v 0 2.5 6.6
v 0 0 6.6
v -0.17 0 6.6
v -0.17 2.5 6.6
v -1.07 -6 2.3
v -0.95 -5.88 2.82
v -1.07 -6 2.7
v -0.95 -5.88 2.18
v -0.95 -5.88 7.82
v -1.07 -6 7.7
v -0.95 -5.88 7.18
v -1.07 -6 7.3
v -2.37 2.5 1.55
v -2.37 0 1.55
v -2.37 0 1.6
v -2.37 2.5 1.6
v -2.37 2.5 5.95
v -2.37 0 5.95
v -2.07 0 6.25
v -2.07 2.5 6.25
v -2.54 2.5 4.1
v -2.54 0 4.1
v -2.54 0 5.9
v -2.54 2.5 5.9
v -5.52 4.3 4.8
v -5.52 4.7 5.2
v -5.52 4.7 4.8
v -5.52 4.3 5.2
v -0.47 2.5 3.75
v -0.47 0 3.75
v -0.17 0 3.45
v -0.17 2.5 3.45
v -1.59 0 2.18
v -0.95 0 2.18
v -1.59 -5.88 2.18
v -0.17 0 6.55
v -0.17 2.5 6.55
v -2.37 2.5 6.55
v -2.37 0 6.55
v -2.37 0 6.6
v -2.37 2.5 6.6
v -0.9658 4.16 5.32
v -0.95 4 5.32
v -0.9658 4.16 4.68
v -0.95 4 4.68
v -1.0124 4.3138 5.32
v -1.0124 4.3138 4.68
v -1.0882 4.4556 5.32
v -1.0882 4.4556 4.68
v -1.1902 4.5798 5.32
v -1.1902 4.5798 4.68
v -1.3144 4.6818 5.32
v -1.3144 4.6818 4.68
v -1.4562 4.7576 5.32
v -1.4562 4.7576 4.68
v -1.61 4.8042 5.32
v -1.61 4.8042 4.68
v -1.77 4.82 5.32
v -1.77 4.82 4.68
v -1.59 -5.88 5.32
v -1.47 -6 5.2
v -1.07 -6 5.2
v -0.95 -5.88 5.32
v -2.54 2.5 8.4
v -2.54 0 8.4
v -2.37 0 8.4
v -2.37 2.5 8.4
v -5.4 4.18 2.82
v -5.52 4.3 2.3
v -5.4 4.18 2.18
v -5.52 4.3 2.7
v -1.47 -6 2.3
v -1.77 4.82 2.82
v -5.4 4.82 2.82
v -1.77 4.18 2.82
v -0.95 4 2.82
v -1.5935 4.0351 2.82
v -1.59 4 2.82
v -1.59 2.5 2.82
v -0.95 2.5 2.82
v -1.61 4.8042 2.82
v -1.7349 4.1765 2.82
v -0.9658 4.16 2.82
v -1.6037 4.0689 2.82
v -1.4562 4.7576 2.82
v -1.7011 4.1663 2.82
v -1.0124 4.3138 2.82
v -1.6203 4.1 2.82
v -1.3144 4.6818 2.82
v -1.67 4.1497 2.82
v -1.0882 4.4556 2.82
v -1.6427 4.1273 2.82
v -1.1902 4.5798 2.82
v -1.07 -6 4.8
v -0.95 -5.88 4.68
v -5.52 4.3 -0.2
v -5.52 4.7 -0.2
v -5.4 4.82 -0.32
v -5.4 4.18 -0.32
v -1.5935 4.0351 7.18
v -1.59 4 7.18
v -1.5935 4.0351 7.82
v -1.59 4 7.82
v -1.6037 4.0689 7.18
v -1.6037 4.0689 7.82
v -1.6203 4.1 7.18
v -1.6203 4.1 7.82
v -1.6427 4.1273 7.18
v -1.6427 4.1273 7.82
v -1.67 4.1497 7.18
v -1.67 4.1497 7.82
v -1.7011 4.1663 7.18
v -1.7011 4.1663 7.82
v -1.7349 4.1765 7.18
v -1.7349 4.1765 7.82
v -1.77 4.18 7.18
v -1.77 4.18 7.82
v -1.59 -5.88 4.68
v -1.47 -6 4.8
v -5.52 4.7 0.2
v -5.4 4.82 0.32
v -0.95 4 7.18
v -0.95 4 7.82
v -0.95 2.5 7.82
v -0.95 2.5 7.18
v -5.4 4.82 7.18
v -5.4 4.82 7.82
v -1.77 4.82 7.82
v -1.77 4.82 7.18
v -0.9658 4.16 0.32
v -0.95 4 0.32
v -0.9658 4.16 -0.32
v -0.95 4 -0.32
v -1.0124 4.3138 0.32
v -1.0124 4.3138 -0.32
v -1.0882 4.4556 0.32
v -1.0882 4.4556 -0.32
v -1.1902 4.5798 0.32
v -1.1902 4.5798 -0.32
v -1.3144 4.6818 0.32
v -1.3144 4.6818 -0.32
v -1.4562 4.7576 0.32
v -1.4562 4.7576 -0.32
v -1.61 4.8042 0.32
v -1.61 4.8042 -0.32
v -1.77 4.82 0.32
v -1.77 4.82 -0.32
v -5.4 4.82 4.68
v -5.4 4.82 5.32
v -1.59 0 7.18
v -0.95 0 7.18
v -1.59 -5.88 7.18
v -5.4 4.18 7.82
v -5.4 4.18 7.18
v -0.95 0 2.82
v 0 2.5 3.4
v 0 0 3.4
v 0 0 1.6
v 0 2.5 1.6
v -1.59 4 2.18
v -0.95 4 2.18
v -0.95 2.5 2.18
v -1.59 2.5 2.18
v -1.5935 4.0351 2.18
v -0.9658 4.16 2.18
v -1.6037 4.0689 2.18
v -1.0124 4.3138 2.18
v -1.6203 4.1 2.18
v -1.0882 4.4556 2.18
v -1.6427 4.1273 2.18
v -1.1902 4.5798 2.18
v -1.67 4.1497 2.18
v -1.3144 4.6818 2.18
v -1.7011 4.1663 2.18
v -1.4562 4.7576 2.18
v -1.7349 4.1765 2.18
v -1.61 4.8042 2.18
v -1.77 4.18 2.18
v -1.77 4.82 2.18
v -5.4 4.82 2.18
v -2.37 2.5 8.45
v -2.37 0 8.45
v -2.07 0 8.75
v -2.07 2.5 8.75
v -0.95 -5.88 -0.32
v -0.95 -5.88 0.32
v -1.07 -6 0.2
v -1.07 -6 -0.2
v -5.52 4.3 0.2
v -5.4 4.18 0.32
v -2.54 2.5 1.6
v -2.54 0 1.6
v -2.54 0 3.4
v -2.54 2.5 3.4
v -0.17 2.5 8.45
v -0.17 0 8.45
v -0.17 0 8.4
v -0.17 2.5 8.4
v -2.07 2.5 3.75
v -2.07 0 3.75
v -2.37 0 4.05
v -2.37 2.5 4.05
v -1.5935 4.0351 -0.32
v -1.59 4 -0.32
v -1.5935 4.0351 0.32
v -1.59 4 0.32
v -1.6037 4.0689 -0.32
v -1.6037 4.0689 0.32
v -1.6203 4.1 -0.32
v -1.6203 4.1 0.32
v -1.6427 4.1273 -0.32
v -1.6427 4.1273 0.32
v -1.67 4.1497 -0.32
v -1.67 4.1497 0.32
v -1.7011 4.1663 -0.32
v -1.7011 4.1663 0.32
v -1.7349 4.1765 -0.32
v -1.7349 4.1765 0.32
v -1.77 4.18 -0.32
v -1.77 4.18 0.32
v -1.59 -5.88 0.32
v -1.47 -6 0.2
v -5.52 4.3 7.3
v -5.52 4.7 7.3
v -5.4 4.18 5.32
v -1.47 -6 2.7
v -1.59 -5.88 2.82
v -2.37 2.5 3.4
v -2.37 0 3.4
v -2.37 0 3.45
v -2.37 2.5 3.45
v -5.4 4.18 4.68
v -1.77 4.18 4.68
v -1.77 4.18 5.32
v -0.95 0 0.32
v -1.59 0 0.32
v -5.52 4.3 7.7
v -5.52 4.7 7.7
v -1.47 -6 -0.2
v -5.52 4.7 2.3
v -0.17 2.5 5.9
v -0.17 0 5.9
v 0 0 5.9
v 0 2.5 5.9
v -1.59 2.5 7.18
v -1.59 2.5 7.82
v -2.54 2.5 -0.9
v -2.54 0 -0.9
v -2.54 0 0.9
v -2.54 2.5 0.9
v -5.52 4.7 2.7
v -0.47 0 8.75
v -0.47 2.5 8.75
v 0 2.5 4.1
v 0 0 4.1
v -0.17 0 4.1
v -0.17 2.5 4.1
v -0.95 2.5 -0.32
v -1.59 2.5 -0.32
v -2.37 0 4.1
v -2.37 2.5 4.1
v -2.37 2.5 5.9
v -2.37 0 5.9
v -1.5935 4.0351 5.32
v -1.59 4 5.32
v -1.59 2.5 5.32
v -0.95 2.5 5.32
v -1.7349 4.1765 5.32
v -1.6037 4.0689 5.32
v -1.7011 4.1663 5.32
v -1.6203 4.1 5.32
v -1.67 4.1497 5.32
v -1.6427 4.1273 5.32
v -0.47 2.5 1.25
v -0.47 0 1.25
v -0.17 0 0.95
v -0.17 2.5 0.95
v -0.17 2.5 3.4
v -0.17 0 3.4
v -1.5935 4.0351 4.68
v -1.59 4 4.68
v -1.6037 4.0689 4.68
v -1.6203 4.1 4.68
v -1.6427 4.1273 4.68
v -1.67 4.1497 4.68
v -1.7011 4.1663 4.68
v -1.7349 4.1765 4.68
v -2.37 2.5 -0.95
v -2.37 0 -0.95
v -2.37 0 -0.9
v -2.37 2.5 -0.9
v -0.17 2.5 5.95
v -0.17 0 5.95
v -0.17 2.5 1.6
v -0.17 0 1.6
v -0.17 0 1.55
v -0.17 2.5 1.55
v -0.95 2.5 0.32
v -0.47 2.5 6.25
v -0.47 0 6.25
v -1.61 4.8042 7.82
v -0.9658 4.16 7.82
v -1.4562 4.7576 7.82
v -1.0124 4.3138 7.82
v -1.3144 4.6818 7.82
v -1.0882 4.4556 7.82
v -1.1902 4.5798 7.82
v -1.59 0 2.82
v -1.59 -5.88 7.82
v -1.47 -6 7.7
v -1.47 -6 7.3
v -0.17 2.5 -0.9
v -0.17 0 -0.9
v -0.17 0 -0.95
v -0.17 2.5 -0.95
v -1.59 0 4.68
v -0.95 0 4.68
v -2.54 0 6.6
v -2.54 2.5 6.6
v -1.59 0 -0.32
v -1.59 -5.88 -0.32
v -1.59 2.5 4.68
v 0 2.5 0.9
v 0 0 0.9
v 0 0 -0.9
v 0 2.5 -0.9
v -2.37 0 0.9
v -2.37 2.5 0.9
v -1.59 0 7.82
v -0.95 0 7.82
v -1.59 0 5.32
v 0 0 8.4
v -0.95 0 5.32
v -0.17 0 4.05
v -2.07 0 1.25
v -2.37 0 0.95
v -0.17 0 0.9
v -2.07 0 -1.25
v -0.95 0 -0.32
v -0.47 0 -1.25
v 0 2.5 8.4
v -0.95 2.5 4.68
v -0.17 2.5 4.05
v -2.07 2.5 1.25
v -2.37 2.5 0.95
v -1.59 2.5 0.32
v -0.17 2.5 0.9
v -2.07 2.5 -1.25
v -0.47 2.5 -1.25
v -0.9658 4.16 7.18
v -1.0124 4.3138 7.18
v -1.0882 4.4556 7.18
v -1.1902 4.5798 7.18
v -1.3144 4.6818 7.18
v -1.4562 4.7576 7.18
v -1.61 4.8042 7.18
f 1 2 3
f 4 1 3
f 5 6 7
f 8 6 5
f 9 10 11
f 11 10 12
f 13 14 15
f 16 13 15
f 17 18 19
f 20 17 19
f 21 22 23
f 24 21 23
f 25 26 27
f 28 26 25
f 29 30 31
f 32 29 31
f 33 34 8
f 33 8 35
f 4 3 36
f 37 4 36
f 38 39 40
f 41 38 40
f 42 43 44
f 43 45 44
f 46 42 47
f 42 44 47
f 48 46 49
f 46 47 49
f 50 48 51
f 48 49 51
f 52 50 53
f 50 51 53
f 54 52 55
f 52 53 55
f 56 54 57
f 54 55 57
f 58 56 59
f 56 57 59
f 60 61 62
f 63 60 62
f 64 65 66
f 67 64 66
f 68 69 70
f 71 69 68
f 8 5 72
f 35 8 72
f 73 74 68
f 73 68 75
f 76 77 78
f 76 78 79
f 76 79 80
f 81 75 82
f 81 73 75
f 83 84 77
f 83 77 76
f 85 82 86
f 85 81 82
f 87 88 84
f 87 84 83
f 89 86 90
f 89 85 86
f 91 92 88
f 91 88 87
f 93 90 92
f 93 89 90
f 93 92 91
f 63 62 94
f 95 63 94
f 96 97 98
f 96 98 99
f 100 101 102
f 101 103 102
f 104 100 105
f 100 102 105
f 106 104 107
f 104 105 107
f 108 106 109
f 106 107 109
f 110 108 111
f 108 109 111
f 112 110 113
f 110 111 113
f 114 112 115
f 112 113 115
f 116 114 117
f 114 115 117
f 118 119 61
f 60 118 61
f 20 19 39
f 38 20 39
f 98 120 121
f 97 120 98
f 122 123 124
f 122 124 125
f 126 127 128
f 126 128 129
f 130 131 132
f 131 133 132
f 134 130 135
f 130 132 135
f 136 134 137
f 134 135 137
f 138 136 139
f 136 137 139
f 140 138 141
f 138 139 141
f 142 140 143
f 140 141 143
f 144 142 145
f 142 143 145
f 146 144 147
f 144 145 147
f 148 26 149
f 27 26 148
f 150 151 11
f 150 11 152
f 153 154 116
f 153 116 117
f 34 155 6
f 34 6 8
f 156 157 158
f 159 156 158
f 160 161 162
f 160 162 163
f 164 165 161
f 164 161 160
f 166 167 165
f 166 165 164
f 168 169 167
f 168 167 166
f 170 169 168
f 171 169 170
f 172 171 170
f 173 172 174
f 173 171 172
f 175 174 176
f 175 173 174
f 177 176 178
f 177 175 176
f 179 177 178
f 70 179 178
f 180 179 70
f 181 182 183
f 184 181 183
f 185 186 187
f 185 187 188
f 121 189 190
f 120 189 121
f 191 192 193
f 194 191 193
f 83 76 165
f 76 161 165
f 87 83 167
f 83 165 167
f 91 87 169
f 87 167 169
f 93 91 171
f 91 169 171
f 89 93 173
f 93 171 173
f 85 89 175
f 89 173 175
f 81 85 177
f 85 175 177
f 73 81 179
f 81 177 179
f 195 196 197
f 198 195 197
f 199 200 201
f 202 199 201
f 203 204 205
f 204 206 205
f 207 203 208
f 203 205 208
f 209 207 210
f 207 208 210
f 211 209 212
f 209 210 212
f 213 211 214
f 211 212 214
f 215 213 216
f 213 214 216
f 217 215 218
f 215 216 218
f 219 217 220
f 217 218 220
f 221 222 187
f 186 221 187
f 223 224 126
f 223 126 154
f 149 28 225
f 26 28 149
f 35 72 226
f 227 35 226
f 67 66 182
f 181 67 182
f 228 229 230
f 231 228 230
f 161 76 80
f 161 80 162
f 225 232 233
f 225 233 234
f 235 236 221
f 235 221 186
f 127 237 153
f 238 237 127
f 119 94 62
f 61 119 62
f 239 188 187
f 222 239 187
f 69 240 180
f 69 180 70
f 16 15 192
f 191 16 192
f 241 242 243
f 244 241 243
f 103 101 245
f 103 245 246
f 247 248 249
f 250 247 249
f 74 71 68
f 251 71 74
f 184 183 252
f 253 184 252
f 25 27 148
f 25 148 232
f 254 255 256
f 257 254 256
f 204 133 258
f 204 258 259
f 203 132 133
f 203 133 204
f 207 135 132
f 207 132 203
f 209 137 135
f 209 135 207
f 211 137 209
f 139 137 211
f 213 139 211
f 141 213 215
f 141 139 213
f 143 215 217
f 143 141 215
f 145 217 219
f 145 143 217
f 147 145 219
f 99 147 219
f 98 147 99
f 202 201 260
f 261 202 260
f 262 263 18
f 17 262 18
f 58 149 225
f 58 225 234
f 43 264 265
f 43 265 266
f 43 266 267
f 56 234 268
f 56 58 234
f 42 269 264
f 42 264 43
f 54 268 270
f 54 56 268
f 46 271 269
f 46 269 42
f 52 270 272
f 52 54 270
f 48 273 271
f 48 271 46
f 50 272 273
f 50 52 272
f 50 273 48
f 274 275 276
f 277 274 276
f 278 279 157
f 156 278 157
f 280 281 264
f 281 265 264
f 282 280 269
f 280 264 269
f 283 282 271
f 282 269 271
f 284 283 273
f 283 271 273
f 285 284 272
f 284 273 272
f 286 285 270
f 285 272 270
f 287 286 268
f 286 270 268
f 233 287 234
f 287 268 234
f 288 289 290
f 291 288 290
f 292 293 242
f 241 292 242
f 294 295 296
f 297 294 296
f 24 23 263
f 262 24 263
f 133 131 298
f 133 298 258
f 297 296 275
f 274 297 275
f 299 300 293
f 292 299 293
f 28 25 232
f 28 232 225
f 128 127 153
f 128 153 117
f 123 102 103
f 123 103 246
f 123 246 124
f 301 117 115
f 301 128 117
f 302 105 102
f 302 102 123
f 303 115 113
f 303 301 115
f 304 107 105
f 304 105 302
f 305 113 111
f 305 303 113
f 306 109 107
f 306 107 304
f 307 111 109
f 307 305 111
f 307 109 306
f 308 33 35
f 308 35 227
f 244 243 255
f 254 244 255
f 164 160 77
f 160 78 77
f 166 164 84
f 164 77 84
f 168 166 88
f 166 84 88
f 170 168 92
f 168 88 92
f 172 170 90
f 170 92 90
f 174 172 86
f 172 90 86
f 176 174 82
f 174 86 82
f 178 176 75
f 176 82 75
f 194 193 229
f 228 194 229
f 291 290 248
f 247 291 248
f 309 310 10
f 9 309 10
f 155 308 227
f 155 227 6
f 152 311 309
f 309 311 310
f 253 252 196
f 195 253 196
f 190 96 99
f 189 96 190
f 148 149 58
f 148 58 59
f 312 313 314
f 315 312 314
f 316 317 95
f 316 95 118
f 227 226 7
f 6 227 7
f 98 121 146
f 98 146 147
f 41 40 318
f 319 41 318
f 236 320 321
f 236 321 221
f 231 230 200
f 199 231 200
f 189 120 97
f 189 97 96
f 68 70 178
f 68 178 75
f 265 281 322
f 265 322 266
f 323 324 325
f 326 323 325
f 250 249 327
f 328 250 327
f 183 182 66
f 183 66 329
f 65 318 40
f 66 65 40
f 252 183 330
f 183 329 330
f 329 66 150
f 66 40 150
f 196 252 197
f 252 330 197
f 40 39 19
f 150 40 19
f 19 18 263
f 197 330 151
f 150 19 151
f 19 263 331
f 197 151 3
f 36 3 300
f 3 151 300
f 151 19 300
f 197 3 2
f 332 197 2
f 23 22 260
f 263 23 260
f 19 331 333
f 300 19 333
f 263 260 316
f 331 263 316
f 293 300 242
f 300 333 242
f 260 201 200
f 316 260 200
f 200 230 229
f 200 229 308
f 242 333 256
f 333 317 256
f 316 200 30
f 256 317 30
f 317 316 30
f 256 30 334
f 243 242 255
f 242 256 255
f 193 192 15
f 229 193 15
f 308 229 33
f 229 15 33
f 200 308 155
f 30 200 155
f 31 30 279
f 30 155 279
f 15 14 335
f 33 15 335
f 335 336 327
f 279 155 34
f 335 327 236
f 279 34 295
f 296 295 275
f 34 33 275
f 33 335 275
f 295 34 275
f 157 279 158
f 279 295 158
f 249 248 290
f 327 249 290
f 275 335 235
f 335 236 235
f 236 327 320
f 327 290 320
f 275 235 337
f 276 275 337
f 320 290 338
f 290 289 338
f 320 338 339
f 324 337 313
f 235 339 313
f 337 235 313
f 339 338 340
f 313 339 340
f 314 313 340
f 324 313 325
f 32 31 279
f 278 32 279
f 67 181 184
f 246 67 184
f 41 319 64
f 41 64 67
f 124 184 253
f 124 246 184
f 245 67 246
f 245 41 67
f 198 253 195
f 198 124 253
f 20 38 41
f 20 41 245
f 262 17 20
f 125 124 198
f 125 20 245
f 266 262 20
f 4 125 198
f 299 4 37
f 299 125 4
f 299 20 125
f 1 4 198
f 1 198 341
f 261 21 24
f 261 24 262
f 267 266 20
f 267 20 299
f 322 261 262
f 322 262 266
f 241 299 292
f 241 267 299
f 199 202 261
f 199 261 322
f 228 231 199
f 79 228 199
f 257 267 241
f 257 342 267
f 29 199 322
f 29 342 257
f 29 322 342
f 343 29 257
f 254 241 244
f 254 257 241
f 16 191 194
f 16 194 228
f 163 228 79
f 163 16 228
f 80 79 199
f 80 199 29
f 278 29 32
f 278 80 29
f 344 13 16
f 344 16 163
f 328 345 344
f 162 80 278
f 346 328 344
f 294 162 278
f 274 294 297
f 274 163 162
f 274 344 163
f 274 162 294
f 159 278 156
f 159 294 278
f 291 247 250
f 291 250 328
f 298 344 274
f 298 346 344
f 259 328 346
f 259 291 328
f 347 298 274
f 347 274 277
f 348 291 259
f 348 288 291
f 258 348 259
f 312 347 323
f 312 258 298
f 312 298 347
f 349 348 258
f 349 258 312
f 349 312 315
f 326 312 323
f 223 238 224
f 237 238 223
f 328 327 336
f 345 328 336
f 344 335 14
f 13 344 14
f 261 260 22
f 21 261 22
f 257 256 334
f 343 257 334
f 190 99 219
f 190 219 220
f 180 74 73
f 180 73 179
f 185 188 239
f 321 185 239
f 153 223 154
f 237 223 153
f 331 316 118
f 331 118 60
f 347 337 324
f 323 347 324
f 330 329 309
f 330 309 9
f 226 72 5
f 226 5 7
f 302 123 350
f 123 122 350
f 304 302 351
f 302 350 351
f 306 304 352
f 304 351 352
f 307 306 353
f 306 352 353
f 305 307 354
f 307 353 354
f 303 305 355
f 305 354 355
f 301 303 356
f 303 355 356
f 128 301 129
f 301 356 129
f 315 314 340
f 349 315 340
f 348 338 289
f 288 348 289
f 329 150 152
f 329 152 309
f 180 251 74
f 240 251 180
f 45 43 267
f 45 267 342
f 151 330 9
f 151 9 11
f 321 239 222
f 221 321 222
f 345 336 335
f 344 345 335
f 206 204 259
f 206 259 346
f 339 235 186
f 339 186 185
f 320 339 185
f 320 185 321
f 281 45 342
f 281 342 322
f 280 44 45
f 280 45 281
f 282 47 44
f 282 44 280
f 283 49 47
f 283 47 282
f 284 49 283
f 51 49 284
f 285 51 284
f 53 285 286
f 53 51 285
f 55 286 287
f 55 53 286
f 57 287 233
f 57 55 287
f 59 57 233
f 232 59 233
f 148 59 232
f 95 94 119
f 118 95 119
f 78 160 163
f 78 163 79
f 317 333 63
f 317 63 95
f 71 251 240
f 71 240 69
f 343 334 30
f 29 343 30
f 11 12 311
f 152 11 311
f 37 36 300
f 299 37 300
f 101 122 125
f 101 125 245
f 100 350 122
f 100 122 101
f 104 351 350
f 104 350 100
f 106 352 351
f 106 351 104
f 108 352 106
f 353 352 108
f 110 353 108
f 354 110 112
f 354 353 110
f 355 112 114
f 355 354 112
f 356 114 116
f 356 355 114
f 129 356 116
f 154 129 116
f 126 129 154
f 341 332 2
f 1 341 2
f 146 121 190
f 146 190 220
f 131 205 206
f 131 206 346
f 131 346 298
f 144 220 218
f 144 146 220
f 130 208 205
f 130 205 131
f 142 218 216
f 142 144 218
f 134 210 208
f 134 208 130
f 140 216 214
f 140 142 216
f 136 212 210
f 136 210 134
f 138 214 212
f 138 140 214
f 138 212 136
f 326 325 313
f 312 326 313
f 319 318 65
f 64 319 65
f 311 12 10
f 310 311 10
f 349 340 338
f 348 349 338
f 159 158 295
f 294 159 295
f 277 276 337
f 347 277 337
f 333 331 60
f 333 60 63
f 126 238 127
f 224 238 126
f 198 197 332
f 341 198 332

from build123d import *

# Parameters (mm, degrees)
BOSS_EXTRUDE1_DEPTH        = 2.5
SKETCH6_W                  = 0.64
SKETCH6_H                  = 0.64
CUT_EXTRUDE1_DEPTH         = 2.5
SKETCH15_W                 = 0.64
SKETCH15_H                 = 0.64
CHAMFER4_SIZE              = 0.12
LPATTERN5_COUNT            = 4
LPATTERN5_PITCH            = 2.5
CHAMFER4_OF_LPATTERN5_SIZE = 0.12


with BuildPart() as part:
    # Sketch4 → Boss-Extrude1 (new body)
    with BuildSketch(Plane(origin=(0, 0, 0), x_dir=(1, 0, 0), z_dir=(0, 1, 0))):
        Polygon((-2.37, -0.9), (-2.37, -0.95), (-2.07, -1.25), (-0.47, -1.25), (-0.17, -0.95), (-0.17, -0.9), (0, -0.9), (0, 0.9), (-0.17, 0.9), (-0.17, 0.95), (-0.47, 1.25), (-2.07, 1.25), (-2.37, 0.95), (-2.37, 0.9), (-2.54, 0.9), (-2.54, -0.9), align=None)
    boss_extrude1 = extrude(amount=BOSS_EXTRUDE1_DEPTH)

    # Sketch6 → Cut-Extrude1 (cut)
    with BuildSketch(Plane.XZ):
        with Locations((-1.27, 0)):
            Rectangle(SKETCH6_W, SKETCH6_H)
        with Locations((1.27, 0)):
            Rectangle(SKETCH6_W, SKETCH6_H)
    extrude(amount=-CUT_EXTRUDE1_DEPTH, mode=Mode.SUBTRACT)

    # Sweep1: sweep along a path in Sketch17
    with BuildLine(Plane(origin=(0, 0, 0), x_dir=(1, 0, 0), z_dir=(0, 0, -1))) as sweep1_path:
        Line((-1.27, 6), (-1.27, -4))
        ThreePointArc((-1.27, -4), (-1.416446609, -4.353553391), (-1.77, -4.5))
        Line((-1.77, -4.5), (-5.52, -4.5))
    # Sketch15 → Sweep1 (sweep)
    with BuildSketch(Plane(origin=(0, -6, 0), x_dir=(1, 0, 0), z_dir=(0, 1, 0))):
        with Locations((-1.27, 0)):
            Rectangle(SKETCH15_W, SKETCH15_H)
    sweep1 = sweep(path=sweep1_path.line)

    # Chamfer4
    chamfer4_edges = [part.edges().sort_by_distance(p)[0] for p in [
        (-0.95, -6, 0),
        (-1.59, -6, 0),
        (-1.27, -6, -0.32),
        (-1.27, -6, 0.32),
        (-5.52, 4.18, 0),
        (-5.52, 4.5, 0.32),
        (-5.52, 4.82, 0),
        (-5.52, 4.5, -0.32),
    ]]
    chamfer(chamfer4_edges, length=CHAMFER4_SIZE)

    # LPattern5: Boss-Extrude1, Sweep1 ×4
    with Locations(*[(0, 0, i * LPATTERN5_PITCH) for i in range(1, LPATTERN5_COUNT)]):
        add(boss_extrude1)
        add(sweep1)

    # Chamfer4 of LPattern5
    chamfer4_of_lpattern5_edges = [part.edges().sort_by_distance(p)[0] for p in [
        (-0.95, -6, 2.5),
        (-1.59, -6, 2.5),
        (-1.27, -6, 2.18),
        (-1.27, -6, 2.82),
        (-5.52, 4.18, 2.5),
        (-5.52, 4.5, 2.82),
        (-5.52, 4.82, 2.5),
        (-5.52, 4.5, 2.18),
        (-0.95, -6, 5),
        (-1.59, -6, 5),
        (-1.27, -6, 4.68),
        (-1.27, -6, 5.32),
        (-5.52, 4.18, 5),
        (-5.52, 4.5, 5.32),
        (-5.52, 4.82, 5),
        (-5.52, 4.5, 4.68),
        (-0.95, -6, 7.5),
        (-1.59, -6, 7.5),
        (-1.27, -6, 7.18),
        (-1.27, -6, 7.82),
        (-5.52, 4.18, 7.5),
        (-5.52, 4.5, 7.82),
        (-5.52, 4.82, 7.5),
        (-5.52, 4.5, 7.18),
    ]]
    chamfer(chamfer4_of_lpattern5_edges, length=CHAMFER4_OF_LPATTERN5_SIZE)


solid = part.part
